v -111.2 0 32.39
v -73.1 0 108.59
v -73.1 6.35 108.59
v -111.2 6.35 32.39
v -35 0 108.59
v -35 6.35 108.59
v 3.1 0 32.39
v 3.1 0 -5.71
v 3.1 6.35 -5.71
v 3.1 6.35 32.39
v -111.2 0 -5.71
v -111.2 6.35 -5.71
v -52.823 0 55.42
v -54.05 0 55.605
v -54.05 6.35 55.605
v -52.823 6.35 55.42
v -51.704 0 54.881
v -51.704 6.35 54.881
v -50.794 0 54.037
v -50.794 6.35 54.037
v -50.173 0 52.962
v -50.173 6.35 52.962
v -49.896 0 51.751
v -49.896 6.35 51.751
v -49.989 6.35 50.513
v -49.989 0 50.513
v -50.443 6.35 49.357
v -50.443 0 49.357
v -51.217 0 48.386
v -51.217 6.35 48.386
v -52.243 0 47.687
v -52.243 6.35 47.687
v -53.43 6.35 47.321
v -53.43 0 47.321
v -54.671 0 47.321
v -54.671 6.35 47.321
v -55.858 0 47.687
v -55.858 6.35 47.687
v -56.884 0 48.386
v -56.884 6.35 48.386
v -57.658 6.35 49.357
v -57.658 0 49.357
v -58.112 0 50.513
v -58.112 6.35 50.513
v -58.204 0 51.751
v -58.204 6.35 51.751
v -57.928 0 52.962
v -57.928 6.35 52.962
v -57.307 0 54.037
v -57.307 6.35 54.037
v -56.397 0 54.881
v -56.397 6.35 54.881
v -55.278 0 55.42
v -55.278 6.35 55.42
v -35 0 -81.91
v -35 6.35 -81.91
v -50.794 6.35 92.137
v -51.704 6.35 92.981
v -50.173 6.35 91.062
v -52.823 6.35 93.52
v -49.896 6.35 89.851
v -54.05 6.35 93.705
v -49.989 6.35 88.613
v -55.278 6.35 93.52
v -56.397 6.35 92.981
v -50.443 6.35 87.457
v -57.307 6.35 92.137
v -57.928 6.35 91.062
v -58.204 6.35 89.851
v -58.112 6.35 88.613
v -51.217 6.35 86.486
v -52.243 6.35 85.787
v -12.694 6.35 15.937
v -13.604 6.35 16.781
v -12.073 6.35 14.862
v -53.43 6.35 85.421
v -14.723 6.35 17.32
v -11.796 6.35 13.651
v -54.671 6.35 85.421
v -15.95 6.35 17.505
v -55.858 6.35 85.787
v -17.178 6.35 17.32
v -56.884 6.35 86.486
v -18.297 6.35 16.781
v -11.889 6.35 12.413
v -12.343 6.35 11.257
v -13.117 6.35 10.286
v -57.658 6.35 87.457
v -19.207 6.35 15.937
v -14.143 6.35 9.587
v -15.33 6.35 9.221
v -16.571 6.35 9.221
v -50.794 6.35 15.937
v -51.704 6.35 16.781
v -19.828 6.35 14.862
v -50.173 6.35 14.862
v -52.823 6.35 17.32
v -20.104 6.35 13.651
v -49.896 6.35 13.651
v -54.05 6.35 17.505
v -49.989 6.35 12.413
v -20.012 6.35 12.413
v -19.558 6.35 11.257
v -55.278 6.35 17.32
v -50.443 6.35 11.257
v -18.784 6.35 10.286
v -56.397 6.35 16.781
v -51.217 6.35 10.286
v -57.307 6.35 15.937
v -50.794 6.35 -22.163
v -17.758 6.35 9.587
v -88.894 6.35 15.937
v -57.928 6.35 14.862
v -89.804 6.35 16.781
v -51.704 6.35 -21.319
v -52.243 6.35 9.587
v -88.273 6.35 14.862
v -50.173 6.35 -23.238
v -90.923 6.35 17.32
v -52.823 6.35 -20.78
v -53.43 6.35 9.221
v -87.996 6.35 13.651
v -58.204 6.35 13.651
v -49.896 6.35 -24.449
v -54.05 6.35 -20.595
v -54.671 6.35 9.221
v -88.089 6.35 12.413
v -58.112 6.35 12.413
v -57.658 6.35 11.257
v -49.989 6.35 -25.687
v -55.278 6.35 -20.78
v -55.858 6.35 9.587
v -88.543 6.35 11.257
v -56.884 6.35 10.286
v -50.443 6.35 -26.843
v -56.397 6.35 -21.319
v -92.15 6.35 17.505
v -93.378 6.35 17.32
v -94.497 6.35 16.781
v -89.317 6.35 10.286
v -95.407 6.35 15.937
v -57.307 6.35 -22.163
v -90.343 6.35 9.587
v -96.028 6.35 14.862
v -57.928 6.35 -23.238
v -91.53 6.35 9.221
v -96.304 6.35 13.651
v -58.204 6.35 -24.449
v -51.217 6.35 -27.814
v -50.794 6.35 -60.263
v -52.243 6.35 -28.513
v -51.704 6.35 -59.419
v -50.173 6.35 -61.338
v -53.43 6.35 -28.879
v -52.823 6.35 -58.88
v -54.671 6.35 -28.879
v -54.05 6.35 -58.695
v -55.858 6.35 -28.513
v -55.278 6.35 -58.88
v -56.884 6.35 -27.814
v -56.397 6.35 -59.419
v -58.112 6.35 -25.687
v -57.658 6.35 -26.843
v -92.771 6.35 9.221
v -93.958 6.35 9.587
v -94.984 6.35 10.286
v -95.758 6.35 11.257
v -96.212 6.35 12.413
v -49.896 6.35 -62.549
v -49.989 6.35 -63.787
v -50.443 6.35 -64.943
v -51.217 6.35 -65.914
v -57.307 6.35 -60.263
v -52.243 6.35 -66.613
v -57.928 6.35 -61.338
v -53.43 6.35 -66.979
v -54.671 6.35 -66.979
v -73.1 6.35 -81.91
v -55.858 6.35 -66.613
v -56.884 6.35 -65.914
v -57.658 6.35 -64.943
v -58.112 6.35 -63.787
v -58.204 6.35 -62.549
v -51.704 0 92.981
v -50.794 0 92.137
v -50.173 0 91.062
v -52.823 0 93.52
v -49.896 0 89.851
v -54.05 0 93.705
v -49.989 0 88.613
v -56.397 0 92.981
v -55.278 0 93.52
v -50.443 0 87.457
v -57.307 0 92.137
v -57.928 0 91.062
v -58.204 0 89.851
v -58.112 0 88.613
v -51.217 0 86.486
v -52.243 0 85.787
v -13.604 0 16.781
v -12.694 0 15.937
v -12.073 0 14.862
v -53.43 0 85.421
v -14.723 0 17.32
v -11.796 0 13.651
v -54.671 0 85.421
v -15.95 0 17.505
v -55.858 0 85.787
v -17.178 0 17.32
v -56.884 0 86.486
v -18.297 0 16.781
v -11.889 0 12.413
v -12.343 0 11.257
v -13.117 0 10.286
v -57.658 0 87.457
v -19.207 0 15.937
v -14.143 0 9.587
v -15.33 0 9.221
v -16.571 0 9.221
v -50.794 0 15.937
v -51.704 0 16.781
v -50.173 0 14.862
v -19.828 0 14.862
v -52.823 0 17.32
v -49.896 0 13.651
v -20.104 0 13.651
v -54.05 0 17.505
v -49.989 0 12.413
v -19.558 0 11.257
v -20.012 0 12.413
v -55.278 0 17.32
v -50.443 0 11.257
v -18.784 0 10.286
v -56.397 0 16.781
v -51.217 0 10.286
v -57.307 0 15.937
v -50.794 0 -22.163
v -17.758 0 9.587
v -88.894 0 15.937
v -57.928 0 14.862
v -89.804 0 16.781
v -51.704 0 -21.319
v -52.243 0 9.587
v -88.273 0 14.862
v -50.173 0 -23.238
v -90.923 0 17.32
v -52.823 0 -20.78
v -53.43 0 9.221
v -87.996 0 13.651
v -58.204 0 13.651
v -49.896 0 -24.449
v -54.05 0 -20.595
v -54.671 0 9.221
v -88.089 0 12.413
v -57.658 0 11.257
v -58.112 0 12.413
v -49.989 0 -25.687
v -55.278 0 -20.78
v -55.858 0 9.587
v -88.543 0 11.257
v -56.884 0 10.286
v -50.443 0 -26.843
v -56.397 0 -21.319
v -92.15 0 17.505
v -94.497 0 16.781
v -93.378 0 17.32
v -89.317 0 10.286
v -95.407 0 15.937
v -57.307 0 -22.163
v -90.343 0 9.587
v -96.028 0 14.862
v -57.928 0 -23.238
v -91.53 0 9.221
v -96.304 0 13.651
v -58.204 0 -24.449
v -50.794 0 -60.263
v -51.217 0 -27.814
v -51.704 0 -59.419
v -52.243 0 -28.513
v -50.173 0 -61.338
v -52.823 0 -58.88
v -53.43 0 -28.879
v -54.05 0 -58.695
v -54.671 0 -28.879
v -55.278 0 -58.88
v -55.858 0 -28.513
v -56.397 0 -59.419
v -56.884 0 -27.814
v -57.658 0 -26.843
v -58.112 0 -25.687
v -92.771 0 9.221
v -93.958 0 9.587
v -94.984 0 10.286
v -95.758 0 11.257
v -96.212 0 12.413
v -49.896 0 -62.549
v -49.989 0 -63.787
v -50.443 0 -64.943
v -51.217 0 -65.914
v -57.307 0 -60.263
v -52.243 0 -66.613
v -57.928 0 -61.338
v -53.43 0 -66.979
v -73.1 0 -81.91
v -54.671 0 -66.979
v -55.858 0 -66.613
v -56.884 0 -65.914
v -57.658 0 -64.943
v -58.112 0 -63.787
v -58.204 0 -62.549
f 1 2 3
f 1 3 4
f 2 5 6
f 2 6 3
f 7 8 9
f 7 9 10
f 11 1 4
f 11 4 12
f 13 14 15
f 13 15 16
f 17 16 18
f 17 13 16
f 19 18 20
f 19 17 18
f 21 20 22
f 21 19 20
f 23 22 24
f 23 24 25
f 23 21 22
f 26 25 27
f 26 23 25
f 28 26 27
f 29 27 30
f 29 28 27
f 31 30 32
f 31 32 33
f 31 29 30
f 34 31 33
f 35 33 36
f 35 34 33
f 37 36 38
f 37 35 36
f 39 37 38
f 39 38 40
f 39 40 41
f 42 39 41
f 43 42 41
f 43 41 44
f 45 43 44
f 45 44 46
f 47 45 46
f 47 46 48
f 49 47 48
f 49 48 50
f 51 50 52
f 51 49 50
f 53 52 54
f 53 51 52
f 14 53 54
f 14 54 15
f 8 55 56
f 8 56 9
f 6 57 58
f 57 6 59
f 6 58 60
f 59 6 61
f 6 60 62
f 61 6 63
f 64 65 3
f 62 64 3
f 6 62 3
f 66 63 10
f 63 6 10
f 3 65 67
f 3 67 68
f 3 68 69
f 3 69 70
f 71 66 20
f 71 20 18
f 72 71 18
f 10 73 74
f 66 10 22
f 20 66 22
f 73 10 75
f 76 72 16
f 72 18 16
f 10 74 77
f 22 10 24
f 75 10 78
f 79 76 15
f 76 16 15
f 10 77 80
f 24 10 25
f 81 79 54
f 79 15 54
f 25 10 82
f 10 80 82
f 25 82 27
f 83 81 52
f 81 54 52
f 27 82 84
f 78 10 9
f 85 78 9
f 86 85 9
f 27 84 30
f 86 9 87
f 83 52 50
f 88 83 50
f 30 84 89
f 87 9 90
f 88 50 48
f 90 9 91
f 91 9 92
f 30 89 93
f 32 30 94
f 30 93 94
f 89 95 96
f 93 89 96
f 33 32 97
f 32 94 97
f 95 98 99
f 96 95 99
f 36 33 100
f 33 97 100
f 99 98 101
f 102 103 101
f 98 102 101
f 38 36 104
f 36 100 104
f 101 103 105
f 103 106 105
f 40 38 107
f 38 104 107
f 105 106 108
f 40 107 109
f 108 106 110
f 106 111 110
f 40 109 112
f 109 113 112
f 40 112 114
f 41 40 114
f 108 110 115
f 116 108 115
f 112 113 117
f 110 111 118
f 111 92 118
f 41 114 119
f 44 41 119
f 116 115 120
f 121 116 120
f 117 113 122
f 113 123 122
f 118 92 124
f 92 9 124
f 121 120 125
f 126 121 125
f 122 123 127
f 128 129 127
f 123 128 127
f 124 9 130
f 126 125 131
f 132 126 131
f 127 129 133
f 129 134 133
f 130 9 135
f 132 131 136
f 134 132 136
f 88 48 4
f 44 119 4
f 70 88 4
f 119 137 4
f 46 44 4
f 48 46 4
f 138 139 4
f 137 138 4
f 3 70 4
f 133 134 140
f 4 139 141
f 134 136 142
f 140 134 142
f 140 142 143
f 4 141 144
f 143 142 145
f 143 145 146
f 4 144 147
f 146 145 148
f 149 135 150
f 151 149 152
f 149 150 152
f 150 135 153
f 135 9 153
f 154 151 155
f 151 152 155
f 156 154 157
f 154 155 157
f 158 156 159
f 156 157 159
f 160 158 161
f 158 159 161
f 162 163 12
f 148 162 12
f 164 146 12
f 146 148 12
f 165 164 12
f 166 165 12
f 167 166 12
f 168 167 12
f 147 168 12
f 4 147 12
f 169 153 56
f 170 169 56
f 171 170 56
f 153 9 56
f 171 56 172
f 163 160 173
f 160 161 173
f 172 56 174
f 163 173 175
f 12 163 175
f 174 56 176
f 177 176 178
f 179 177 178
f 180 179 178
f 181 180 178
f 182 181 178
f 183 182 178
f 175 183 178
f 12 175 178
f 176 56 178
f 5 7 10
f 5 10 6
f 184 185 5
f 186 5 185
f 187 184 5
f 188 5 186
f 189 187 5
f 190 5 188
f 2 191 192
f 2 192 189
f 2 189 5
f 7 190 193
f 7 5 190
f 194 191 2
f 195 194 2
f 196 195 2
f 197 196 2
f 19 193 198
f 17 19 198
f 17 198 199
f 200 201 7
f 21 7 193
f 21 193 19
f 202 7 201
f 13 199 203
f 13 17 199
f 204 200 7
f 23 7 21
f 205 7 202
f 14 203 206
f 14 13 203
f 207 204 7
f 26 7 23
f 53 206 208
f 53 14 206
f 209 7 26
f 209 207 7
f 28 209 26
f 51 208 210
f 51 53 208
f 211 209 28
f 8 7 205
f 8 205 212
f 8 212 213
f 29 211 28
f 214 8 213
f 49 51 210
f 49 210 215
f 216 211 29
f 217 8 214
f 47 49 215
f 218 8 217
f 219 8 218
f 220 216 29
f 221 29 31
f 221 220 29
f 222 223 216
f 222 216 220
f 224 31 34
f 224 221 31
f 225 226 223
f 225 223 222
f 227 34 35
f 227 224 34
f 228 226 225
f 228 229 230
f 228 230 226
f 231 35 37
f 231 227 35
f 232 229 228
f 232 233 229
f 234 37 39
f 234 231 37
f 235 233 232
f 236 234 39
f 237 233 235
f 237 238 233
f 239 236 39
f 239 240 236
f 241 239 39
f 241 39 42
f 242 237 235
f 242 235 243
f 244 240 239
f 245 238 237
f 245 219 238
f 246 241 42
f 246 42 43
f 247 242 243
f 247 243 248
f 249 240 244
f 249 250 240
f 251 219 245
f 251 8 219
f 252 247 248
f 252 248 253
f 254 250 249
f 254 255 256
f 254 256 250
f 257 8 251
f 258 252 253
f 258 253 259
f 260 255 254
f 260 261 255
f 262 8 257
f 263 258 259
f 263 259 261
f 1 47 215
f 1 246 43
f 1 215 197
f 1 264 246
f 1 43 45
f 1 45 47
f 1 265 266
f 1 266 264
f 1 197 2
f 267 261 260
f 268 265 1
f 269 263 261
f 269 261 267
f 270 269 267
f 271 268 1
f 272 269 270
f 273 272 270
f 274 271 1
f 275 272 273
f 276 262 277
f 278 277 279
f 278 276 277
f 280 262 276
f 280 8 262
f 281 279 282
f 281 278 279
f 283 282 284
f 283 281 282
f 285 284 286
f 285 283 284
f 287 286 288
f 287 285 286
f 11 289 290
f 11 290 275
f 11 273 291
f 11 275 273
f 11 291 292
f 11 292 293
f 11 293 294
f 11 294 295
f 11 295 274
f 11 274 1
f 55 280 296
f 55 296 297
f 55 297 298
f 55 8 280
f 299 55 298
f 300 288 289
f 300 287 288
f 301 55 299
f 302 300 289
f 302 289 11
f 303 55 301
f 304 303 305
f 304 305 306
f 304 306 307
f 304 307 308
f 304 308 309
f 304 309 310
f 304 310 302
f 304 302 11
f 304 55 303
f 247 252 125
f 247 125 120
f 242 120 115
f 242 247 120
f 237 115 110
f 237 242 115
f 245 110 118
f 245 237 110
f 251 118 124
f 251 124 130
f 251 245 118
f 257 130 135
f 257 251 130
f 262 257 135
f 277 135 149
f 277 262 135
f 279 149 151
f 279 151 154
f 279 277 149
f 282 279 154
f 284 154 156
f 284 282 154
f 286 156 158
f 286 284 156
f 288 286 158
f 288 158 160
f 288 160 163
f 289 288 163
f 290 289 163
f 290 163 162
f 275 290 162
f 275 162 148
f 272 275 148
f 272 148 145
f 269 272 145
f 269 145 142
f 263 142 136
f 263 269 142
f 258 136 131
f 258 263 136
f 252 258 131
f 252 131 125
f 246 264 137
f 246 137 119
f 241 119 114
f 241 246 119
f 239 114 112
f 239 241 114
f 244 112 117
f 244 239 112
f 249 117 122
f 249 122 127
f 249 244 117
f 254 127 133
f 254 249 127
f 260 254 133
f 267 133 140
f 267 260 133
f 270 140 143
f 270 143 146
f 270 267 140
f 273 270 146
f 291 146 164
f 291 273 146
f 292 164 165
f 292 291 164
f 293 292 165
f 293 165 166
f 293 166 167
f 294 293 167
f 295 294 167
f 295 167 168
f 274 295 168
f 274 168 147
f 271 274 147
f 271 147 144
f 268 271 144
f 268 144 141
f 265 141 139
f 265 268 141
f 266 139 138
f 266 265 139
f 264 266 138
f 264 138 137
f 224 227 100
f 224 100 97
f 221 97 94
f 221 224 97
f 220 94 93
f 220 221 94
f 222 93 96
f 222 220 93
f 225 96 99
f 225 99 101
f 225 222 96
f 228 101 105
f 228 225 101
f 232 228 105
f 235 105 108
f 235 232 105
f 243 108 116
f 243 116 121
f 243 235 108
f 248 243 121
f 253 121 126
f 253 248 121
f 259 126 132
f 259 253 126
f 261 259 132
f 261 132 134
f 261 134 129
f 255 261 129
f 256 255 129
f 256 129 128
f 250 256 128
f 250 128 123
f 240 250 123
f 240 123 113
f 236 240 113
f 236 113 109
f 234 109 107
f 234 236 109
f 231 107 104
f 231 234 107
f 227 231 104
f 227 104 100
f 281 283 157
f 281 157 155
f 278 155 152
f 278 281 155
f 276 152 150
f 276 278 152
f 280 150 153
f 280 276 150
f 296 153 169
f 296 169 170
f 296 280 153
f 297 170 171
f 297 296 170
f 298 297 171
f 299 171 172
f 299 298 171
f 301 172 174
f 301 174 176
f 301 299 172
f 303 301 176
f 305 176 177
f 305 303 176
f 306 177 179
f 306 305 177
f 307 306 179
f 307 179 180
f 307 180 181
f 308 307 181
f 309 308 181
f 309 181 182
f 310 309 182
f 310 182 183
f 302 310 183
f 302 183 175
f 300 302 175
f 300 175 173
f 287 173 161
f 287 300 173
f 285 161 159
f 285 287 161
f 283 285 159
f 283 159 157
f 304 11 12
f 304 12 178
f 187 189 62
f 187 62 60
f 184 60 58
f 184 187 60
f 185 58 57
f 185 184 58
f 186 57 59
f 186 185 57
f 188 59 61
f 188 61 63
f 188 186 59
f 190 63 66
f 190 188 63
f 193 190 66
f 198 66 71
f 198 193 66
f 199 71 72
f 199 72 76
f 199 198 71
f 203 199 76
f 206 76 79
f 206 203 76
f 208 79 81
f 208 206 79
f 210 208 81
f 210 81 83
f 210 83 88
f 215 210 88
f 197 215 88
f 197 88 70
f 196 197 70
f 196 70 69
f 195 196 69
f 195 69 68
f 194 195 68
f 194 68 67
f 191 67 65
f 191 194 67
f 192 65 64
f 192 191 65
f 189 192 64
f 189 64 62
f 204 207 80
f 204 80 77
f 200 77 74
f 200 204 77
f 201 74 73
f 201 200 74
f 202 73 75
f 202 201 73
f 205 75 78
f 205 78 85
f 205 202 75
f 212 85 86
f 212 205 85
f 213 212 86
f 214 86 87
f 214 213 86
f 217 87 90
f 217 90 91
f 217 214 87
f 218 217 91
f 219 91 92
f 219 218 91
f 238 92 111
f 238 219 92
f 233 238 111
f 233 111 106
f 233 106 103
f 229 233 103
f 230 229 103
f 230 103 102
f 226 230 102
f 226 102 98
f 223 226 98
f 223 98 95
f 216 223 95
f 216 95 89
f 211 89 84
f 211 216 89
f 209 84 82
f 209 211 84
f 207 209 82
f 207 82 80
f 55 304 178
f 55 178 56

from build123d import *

# Parameters (mm, degrees)
SKETCH1_R           = 4.1656
BOSS_EXTRUDE1_DEPTH = 6.35


with BuildPart() as part:
    # Sketch1 → Boss-Extrude1 (new body)
    with BuildSketch(Plane(origin=(0, 0, 0), x_dir=(1, 0, 0), z_dir=(0, 1, 0))):
        Polygon((-73.100424588, 81.91031941), (-35.000424588, 81.91031941), (3.099575412, 5.71031941), (3.099575412, -32.38968059), (-35.000424588, -108.58968059), (-73.100424588, -108.58968059), (-111.200424588, -32.38968059), (-111.200424588, 5.71031941), align=None)
        with Locations(Location((-92.150424588, -13.33968059, 0), (0, 0, 270))):
            Circle(SKETCH1_R, mode=Mode.SUBTRACT)
        with Locations(Location((-54.050424588, -13.33968059, 0), (0, 0, 270))):
            Circle(SKETCH1_R, mode=Mode.SUBTRACT)
        with Locations(Location((-15.950424588, -13.33968059, 0), (0, 0, 270))):
            Circle(SKETCH1_R, mode=Mode.SUBTRACT)
        with Locations(Location((-54.050424588, 24.76031941, 0), (0, 0, 270))):
            Circle(SKETCH1_R, mode=Mode.SUBTRACT)
        with Locations(Location((-54.050424588, 62.86031941, 0), (0, 0, 270))):
            Circle(SKETCH1_R, mode=Mode.SUBTRACT)
        with Locations(Location((-54.050424588, -51.43968059, 0), (0, 0, 270))):
            Circle(SKETCH1_R, mode=Mode.SUBTRACT)
        with Locations(Location((-54.050424588, -89.53968059, 0), (0, 0, 270))):
            Circle(SKETCH1_R, mode=Mode.SUBTRACT)
    extrude(amount=BOSS_EXTRUDE1_DEPTH)


solid = part.part
